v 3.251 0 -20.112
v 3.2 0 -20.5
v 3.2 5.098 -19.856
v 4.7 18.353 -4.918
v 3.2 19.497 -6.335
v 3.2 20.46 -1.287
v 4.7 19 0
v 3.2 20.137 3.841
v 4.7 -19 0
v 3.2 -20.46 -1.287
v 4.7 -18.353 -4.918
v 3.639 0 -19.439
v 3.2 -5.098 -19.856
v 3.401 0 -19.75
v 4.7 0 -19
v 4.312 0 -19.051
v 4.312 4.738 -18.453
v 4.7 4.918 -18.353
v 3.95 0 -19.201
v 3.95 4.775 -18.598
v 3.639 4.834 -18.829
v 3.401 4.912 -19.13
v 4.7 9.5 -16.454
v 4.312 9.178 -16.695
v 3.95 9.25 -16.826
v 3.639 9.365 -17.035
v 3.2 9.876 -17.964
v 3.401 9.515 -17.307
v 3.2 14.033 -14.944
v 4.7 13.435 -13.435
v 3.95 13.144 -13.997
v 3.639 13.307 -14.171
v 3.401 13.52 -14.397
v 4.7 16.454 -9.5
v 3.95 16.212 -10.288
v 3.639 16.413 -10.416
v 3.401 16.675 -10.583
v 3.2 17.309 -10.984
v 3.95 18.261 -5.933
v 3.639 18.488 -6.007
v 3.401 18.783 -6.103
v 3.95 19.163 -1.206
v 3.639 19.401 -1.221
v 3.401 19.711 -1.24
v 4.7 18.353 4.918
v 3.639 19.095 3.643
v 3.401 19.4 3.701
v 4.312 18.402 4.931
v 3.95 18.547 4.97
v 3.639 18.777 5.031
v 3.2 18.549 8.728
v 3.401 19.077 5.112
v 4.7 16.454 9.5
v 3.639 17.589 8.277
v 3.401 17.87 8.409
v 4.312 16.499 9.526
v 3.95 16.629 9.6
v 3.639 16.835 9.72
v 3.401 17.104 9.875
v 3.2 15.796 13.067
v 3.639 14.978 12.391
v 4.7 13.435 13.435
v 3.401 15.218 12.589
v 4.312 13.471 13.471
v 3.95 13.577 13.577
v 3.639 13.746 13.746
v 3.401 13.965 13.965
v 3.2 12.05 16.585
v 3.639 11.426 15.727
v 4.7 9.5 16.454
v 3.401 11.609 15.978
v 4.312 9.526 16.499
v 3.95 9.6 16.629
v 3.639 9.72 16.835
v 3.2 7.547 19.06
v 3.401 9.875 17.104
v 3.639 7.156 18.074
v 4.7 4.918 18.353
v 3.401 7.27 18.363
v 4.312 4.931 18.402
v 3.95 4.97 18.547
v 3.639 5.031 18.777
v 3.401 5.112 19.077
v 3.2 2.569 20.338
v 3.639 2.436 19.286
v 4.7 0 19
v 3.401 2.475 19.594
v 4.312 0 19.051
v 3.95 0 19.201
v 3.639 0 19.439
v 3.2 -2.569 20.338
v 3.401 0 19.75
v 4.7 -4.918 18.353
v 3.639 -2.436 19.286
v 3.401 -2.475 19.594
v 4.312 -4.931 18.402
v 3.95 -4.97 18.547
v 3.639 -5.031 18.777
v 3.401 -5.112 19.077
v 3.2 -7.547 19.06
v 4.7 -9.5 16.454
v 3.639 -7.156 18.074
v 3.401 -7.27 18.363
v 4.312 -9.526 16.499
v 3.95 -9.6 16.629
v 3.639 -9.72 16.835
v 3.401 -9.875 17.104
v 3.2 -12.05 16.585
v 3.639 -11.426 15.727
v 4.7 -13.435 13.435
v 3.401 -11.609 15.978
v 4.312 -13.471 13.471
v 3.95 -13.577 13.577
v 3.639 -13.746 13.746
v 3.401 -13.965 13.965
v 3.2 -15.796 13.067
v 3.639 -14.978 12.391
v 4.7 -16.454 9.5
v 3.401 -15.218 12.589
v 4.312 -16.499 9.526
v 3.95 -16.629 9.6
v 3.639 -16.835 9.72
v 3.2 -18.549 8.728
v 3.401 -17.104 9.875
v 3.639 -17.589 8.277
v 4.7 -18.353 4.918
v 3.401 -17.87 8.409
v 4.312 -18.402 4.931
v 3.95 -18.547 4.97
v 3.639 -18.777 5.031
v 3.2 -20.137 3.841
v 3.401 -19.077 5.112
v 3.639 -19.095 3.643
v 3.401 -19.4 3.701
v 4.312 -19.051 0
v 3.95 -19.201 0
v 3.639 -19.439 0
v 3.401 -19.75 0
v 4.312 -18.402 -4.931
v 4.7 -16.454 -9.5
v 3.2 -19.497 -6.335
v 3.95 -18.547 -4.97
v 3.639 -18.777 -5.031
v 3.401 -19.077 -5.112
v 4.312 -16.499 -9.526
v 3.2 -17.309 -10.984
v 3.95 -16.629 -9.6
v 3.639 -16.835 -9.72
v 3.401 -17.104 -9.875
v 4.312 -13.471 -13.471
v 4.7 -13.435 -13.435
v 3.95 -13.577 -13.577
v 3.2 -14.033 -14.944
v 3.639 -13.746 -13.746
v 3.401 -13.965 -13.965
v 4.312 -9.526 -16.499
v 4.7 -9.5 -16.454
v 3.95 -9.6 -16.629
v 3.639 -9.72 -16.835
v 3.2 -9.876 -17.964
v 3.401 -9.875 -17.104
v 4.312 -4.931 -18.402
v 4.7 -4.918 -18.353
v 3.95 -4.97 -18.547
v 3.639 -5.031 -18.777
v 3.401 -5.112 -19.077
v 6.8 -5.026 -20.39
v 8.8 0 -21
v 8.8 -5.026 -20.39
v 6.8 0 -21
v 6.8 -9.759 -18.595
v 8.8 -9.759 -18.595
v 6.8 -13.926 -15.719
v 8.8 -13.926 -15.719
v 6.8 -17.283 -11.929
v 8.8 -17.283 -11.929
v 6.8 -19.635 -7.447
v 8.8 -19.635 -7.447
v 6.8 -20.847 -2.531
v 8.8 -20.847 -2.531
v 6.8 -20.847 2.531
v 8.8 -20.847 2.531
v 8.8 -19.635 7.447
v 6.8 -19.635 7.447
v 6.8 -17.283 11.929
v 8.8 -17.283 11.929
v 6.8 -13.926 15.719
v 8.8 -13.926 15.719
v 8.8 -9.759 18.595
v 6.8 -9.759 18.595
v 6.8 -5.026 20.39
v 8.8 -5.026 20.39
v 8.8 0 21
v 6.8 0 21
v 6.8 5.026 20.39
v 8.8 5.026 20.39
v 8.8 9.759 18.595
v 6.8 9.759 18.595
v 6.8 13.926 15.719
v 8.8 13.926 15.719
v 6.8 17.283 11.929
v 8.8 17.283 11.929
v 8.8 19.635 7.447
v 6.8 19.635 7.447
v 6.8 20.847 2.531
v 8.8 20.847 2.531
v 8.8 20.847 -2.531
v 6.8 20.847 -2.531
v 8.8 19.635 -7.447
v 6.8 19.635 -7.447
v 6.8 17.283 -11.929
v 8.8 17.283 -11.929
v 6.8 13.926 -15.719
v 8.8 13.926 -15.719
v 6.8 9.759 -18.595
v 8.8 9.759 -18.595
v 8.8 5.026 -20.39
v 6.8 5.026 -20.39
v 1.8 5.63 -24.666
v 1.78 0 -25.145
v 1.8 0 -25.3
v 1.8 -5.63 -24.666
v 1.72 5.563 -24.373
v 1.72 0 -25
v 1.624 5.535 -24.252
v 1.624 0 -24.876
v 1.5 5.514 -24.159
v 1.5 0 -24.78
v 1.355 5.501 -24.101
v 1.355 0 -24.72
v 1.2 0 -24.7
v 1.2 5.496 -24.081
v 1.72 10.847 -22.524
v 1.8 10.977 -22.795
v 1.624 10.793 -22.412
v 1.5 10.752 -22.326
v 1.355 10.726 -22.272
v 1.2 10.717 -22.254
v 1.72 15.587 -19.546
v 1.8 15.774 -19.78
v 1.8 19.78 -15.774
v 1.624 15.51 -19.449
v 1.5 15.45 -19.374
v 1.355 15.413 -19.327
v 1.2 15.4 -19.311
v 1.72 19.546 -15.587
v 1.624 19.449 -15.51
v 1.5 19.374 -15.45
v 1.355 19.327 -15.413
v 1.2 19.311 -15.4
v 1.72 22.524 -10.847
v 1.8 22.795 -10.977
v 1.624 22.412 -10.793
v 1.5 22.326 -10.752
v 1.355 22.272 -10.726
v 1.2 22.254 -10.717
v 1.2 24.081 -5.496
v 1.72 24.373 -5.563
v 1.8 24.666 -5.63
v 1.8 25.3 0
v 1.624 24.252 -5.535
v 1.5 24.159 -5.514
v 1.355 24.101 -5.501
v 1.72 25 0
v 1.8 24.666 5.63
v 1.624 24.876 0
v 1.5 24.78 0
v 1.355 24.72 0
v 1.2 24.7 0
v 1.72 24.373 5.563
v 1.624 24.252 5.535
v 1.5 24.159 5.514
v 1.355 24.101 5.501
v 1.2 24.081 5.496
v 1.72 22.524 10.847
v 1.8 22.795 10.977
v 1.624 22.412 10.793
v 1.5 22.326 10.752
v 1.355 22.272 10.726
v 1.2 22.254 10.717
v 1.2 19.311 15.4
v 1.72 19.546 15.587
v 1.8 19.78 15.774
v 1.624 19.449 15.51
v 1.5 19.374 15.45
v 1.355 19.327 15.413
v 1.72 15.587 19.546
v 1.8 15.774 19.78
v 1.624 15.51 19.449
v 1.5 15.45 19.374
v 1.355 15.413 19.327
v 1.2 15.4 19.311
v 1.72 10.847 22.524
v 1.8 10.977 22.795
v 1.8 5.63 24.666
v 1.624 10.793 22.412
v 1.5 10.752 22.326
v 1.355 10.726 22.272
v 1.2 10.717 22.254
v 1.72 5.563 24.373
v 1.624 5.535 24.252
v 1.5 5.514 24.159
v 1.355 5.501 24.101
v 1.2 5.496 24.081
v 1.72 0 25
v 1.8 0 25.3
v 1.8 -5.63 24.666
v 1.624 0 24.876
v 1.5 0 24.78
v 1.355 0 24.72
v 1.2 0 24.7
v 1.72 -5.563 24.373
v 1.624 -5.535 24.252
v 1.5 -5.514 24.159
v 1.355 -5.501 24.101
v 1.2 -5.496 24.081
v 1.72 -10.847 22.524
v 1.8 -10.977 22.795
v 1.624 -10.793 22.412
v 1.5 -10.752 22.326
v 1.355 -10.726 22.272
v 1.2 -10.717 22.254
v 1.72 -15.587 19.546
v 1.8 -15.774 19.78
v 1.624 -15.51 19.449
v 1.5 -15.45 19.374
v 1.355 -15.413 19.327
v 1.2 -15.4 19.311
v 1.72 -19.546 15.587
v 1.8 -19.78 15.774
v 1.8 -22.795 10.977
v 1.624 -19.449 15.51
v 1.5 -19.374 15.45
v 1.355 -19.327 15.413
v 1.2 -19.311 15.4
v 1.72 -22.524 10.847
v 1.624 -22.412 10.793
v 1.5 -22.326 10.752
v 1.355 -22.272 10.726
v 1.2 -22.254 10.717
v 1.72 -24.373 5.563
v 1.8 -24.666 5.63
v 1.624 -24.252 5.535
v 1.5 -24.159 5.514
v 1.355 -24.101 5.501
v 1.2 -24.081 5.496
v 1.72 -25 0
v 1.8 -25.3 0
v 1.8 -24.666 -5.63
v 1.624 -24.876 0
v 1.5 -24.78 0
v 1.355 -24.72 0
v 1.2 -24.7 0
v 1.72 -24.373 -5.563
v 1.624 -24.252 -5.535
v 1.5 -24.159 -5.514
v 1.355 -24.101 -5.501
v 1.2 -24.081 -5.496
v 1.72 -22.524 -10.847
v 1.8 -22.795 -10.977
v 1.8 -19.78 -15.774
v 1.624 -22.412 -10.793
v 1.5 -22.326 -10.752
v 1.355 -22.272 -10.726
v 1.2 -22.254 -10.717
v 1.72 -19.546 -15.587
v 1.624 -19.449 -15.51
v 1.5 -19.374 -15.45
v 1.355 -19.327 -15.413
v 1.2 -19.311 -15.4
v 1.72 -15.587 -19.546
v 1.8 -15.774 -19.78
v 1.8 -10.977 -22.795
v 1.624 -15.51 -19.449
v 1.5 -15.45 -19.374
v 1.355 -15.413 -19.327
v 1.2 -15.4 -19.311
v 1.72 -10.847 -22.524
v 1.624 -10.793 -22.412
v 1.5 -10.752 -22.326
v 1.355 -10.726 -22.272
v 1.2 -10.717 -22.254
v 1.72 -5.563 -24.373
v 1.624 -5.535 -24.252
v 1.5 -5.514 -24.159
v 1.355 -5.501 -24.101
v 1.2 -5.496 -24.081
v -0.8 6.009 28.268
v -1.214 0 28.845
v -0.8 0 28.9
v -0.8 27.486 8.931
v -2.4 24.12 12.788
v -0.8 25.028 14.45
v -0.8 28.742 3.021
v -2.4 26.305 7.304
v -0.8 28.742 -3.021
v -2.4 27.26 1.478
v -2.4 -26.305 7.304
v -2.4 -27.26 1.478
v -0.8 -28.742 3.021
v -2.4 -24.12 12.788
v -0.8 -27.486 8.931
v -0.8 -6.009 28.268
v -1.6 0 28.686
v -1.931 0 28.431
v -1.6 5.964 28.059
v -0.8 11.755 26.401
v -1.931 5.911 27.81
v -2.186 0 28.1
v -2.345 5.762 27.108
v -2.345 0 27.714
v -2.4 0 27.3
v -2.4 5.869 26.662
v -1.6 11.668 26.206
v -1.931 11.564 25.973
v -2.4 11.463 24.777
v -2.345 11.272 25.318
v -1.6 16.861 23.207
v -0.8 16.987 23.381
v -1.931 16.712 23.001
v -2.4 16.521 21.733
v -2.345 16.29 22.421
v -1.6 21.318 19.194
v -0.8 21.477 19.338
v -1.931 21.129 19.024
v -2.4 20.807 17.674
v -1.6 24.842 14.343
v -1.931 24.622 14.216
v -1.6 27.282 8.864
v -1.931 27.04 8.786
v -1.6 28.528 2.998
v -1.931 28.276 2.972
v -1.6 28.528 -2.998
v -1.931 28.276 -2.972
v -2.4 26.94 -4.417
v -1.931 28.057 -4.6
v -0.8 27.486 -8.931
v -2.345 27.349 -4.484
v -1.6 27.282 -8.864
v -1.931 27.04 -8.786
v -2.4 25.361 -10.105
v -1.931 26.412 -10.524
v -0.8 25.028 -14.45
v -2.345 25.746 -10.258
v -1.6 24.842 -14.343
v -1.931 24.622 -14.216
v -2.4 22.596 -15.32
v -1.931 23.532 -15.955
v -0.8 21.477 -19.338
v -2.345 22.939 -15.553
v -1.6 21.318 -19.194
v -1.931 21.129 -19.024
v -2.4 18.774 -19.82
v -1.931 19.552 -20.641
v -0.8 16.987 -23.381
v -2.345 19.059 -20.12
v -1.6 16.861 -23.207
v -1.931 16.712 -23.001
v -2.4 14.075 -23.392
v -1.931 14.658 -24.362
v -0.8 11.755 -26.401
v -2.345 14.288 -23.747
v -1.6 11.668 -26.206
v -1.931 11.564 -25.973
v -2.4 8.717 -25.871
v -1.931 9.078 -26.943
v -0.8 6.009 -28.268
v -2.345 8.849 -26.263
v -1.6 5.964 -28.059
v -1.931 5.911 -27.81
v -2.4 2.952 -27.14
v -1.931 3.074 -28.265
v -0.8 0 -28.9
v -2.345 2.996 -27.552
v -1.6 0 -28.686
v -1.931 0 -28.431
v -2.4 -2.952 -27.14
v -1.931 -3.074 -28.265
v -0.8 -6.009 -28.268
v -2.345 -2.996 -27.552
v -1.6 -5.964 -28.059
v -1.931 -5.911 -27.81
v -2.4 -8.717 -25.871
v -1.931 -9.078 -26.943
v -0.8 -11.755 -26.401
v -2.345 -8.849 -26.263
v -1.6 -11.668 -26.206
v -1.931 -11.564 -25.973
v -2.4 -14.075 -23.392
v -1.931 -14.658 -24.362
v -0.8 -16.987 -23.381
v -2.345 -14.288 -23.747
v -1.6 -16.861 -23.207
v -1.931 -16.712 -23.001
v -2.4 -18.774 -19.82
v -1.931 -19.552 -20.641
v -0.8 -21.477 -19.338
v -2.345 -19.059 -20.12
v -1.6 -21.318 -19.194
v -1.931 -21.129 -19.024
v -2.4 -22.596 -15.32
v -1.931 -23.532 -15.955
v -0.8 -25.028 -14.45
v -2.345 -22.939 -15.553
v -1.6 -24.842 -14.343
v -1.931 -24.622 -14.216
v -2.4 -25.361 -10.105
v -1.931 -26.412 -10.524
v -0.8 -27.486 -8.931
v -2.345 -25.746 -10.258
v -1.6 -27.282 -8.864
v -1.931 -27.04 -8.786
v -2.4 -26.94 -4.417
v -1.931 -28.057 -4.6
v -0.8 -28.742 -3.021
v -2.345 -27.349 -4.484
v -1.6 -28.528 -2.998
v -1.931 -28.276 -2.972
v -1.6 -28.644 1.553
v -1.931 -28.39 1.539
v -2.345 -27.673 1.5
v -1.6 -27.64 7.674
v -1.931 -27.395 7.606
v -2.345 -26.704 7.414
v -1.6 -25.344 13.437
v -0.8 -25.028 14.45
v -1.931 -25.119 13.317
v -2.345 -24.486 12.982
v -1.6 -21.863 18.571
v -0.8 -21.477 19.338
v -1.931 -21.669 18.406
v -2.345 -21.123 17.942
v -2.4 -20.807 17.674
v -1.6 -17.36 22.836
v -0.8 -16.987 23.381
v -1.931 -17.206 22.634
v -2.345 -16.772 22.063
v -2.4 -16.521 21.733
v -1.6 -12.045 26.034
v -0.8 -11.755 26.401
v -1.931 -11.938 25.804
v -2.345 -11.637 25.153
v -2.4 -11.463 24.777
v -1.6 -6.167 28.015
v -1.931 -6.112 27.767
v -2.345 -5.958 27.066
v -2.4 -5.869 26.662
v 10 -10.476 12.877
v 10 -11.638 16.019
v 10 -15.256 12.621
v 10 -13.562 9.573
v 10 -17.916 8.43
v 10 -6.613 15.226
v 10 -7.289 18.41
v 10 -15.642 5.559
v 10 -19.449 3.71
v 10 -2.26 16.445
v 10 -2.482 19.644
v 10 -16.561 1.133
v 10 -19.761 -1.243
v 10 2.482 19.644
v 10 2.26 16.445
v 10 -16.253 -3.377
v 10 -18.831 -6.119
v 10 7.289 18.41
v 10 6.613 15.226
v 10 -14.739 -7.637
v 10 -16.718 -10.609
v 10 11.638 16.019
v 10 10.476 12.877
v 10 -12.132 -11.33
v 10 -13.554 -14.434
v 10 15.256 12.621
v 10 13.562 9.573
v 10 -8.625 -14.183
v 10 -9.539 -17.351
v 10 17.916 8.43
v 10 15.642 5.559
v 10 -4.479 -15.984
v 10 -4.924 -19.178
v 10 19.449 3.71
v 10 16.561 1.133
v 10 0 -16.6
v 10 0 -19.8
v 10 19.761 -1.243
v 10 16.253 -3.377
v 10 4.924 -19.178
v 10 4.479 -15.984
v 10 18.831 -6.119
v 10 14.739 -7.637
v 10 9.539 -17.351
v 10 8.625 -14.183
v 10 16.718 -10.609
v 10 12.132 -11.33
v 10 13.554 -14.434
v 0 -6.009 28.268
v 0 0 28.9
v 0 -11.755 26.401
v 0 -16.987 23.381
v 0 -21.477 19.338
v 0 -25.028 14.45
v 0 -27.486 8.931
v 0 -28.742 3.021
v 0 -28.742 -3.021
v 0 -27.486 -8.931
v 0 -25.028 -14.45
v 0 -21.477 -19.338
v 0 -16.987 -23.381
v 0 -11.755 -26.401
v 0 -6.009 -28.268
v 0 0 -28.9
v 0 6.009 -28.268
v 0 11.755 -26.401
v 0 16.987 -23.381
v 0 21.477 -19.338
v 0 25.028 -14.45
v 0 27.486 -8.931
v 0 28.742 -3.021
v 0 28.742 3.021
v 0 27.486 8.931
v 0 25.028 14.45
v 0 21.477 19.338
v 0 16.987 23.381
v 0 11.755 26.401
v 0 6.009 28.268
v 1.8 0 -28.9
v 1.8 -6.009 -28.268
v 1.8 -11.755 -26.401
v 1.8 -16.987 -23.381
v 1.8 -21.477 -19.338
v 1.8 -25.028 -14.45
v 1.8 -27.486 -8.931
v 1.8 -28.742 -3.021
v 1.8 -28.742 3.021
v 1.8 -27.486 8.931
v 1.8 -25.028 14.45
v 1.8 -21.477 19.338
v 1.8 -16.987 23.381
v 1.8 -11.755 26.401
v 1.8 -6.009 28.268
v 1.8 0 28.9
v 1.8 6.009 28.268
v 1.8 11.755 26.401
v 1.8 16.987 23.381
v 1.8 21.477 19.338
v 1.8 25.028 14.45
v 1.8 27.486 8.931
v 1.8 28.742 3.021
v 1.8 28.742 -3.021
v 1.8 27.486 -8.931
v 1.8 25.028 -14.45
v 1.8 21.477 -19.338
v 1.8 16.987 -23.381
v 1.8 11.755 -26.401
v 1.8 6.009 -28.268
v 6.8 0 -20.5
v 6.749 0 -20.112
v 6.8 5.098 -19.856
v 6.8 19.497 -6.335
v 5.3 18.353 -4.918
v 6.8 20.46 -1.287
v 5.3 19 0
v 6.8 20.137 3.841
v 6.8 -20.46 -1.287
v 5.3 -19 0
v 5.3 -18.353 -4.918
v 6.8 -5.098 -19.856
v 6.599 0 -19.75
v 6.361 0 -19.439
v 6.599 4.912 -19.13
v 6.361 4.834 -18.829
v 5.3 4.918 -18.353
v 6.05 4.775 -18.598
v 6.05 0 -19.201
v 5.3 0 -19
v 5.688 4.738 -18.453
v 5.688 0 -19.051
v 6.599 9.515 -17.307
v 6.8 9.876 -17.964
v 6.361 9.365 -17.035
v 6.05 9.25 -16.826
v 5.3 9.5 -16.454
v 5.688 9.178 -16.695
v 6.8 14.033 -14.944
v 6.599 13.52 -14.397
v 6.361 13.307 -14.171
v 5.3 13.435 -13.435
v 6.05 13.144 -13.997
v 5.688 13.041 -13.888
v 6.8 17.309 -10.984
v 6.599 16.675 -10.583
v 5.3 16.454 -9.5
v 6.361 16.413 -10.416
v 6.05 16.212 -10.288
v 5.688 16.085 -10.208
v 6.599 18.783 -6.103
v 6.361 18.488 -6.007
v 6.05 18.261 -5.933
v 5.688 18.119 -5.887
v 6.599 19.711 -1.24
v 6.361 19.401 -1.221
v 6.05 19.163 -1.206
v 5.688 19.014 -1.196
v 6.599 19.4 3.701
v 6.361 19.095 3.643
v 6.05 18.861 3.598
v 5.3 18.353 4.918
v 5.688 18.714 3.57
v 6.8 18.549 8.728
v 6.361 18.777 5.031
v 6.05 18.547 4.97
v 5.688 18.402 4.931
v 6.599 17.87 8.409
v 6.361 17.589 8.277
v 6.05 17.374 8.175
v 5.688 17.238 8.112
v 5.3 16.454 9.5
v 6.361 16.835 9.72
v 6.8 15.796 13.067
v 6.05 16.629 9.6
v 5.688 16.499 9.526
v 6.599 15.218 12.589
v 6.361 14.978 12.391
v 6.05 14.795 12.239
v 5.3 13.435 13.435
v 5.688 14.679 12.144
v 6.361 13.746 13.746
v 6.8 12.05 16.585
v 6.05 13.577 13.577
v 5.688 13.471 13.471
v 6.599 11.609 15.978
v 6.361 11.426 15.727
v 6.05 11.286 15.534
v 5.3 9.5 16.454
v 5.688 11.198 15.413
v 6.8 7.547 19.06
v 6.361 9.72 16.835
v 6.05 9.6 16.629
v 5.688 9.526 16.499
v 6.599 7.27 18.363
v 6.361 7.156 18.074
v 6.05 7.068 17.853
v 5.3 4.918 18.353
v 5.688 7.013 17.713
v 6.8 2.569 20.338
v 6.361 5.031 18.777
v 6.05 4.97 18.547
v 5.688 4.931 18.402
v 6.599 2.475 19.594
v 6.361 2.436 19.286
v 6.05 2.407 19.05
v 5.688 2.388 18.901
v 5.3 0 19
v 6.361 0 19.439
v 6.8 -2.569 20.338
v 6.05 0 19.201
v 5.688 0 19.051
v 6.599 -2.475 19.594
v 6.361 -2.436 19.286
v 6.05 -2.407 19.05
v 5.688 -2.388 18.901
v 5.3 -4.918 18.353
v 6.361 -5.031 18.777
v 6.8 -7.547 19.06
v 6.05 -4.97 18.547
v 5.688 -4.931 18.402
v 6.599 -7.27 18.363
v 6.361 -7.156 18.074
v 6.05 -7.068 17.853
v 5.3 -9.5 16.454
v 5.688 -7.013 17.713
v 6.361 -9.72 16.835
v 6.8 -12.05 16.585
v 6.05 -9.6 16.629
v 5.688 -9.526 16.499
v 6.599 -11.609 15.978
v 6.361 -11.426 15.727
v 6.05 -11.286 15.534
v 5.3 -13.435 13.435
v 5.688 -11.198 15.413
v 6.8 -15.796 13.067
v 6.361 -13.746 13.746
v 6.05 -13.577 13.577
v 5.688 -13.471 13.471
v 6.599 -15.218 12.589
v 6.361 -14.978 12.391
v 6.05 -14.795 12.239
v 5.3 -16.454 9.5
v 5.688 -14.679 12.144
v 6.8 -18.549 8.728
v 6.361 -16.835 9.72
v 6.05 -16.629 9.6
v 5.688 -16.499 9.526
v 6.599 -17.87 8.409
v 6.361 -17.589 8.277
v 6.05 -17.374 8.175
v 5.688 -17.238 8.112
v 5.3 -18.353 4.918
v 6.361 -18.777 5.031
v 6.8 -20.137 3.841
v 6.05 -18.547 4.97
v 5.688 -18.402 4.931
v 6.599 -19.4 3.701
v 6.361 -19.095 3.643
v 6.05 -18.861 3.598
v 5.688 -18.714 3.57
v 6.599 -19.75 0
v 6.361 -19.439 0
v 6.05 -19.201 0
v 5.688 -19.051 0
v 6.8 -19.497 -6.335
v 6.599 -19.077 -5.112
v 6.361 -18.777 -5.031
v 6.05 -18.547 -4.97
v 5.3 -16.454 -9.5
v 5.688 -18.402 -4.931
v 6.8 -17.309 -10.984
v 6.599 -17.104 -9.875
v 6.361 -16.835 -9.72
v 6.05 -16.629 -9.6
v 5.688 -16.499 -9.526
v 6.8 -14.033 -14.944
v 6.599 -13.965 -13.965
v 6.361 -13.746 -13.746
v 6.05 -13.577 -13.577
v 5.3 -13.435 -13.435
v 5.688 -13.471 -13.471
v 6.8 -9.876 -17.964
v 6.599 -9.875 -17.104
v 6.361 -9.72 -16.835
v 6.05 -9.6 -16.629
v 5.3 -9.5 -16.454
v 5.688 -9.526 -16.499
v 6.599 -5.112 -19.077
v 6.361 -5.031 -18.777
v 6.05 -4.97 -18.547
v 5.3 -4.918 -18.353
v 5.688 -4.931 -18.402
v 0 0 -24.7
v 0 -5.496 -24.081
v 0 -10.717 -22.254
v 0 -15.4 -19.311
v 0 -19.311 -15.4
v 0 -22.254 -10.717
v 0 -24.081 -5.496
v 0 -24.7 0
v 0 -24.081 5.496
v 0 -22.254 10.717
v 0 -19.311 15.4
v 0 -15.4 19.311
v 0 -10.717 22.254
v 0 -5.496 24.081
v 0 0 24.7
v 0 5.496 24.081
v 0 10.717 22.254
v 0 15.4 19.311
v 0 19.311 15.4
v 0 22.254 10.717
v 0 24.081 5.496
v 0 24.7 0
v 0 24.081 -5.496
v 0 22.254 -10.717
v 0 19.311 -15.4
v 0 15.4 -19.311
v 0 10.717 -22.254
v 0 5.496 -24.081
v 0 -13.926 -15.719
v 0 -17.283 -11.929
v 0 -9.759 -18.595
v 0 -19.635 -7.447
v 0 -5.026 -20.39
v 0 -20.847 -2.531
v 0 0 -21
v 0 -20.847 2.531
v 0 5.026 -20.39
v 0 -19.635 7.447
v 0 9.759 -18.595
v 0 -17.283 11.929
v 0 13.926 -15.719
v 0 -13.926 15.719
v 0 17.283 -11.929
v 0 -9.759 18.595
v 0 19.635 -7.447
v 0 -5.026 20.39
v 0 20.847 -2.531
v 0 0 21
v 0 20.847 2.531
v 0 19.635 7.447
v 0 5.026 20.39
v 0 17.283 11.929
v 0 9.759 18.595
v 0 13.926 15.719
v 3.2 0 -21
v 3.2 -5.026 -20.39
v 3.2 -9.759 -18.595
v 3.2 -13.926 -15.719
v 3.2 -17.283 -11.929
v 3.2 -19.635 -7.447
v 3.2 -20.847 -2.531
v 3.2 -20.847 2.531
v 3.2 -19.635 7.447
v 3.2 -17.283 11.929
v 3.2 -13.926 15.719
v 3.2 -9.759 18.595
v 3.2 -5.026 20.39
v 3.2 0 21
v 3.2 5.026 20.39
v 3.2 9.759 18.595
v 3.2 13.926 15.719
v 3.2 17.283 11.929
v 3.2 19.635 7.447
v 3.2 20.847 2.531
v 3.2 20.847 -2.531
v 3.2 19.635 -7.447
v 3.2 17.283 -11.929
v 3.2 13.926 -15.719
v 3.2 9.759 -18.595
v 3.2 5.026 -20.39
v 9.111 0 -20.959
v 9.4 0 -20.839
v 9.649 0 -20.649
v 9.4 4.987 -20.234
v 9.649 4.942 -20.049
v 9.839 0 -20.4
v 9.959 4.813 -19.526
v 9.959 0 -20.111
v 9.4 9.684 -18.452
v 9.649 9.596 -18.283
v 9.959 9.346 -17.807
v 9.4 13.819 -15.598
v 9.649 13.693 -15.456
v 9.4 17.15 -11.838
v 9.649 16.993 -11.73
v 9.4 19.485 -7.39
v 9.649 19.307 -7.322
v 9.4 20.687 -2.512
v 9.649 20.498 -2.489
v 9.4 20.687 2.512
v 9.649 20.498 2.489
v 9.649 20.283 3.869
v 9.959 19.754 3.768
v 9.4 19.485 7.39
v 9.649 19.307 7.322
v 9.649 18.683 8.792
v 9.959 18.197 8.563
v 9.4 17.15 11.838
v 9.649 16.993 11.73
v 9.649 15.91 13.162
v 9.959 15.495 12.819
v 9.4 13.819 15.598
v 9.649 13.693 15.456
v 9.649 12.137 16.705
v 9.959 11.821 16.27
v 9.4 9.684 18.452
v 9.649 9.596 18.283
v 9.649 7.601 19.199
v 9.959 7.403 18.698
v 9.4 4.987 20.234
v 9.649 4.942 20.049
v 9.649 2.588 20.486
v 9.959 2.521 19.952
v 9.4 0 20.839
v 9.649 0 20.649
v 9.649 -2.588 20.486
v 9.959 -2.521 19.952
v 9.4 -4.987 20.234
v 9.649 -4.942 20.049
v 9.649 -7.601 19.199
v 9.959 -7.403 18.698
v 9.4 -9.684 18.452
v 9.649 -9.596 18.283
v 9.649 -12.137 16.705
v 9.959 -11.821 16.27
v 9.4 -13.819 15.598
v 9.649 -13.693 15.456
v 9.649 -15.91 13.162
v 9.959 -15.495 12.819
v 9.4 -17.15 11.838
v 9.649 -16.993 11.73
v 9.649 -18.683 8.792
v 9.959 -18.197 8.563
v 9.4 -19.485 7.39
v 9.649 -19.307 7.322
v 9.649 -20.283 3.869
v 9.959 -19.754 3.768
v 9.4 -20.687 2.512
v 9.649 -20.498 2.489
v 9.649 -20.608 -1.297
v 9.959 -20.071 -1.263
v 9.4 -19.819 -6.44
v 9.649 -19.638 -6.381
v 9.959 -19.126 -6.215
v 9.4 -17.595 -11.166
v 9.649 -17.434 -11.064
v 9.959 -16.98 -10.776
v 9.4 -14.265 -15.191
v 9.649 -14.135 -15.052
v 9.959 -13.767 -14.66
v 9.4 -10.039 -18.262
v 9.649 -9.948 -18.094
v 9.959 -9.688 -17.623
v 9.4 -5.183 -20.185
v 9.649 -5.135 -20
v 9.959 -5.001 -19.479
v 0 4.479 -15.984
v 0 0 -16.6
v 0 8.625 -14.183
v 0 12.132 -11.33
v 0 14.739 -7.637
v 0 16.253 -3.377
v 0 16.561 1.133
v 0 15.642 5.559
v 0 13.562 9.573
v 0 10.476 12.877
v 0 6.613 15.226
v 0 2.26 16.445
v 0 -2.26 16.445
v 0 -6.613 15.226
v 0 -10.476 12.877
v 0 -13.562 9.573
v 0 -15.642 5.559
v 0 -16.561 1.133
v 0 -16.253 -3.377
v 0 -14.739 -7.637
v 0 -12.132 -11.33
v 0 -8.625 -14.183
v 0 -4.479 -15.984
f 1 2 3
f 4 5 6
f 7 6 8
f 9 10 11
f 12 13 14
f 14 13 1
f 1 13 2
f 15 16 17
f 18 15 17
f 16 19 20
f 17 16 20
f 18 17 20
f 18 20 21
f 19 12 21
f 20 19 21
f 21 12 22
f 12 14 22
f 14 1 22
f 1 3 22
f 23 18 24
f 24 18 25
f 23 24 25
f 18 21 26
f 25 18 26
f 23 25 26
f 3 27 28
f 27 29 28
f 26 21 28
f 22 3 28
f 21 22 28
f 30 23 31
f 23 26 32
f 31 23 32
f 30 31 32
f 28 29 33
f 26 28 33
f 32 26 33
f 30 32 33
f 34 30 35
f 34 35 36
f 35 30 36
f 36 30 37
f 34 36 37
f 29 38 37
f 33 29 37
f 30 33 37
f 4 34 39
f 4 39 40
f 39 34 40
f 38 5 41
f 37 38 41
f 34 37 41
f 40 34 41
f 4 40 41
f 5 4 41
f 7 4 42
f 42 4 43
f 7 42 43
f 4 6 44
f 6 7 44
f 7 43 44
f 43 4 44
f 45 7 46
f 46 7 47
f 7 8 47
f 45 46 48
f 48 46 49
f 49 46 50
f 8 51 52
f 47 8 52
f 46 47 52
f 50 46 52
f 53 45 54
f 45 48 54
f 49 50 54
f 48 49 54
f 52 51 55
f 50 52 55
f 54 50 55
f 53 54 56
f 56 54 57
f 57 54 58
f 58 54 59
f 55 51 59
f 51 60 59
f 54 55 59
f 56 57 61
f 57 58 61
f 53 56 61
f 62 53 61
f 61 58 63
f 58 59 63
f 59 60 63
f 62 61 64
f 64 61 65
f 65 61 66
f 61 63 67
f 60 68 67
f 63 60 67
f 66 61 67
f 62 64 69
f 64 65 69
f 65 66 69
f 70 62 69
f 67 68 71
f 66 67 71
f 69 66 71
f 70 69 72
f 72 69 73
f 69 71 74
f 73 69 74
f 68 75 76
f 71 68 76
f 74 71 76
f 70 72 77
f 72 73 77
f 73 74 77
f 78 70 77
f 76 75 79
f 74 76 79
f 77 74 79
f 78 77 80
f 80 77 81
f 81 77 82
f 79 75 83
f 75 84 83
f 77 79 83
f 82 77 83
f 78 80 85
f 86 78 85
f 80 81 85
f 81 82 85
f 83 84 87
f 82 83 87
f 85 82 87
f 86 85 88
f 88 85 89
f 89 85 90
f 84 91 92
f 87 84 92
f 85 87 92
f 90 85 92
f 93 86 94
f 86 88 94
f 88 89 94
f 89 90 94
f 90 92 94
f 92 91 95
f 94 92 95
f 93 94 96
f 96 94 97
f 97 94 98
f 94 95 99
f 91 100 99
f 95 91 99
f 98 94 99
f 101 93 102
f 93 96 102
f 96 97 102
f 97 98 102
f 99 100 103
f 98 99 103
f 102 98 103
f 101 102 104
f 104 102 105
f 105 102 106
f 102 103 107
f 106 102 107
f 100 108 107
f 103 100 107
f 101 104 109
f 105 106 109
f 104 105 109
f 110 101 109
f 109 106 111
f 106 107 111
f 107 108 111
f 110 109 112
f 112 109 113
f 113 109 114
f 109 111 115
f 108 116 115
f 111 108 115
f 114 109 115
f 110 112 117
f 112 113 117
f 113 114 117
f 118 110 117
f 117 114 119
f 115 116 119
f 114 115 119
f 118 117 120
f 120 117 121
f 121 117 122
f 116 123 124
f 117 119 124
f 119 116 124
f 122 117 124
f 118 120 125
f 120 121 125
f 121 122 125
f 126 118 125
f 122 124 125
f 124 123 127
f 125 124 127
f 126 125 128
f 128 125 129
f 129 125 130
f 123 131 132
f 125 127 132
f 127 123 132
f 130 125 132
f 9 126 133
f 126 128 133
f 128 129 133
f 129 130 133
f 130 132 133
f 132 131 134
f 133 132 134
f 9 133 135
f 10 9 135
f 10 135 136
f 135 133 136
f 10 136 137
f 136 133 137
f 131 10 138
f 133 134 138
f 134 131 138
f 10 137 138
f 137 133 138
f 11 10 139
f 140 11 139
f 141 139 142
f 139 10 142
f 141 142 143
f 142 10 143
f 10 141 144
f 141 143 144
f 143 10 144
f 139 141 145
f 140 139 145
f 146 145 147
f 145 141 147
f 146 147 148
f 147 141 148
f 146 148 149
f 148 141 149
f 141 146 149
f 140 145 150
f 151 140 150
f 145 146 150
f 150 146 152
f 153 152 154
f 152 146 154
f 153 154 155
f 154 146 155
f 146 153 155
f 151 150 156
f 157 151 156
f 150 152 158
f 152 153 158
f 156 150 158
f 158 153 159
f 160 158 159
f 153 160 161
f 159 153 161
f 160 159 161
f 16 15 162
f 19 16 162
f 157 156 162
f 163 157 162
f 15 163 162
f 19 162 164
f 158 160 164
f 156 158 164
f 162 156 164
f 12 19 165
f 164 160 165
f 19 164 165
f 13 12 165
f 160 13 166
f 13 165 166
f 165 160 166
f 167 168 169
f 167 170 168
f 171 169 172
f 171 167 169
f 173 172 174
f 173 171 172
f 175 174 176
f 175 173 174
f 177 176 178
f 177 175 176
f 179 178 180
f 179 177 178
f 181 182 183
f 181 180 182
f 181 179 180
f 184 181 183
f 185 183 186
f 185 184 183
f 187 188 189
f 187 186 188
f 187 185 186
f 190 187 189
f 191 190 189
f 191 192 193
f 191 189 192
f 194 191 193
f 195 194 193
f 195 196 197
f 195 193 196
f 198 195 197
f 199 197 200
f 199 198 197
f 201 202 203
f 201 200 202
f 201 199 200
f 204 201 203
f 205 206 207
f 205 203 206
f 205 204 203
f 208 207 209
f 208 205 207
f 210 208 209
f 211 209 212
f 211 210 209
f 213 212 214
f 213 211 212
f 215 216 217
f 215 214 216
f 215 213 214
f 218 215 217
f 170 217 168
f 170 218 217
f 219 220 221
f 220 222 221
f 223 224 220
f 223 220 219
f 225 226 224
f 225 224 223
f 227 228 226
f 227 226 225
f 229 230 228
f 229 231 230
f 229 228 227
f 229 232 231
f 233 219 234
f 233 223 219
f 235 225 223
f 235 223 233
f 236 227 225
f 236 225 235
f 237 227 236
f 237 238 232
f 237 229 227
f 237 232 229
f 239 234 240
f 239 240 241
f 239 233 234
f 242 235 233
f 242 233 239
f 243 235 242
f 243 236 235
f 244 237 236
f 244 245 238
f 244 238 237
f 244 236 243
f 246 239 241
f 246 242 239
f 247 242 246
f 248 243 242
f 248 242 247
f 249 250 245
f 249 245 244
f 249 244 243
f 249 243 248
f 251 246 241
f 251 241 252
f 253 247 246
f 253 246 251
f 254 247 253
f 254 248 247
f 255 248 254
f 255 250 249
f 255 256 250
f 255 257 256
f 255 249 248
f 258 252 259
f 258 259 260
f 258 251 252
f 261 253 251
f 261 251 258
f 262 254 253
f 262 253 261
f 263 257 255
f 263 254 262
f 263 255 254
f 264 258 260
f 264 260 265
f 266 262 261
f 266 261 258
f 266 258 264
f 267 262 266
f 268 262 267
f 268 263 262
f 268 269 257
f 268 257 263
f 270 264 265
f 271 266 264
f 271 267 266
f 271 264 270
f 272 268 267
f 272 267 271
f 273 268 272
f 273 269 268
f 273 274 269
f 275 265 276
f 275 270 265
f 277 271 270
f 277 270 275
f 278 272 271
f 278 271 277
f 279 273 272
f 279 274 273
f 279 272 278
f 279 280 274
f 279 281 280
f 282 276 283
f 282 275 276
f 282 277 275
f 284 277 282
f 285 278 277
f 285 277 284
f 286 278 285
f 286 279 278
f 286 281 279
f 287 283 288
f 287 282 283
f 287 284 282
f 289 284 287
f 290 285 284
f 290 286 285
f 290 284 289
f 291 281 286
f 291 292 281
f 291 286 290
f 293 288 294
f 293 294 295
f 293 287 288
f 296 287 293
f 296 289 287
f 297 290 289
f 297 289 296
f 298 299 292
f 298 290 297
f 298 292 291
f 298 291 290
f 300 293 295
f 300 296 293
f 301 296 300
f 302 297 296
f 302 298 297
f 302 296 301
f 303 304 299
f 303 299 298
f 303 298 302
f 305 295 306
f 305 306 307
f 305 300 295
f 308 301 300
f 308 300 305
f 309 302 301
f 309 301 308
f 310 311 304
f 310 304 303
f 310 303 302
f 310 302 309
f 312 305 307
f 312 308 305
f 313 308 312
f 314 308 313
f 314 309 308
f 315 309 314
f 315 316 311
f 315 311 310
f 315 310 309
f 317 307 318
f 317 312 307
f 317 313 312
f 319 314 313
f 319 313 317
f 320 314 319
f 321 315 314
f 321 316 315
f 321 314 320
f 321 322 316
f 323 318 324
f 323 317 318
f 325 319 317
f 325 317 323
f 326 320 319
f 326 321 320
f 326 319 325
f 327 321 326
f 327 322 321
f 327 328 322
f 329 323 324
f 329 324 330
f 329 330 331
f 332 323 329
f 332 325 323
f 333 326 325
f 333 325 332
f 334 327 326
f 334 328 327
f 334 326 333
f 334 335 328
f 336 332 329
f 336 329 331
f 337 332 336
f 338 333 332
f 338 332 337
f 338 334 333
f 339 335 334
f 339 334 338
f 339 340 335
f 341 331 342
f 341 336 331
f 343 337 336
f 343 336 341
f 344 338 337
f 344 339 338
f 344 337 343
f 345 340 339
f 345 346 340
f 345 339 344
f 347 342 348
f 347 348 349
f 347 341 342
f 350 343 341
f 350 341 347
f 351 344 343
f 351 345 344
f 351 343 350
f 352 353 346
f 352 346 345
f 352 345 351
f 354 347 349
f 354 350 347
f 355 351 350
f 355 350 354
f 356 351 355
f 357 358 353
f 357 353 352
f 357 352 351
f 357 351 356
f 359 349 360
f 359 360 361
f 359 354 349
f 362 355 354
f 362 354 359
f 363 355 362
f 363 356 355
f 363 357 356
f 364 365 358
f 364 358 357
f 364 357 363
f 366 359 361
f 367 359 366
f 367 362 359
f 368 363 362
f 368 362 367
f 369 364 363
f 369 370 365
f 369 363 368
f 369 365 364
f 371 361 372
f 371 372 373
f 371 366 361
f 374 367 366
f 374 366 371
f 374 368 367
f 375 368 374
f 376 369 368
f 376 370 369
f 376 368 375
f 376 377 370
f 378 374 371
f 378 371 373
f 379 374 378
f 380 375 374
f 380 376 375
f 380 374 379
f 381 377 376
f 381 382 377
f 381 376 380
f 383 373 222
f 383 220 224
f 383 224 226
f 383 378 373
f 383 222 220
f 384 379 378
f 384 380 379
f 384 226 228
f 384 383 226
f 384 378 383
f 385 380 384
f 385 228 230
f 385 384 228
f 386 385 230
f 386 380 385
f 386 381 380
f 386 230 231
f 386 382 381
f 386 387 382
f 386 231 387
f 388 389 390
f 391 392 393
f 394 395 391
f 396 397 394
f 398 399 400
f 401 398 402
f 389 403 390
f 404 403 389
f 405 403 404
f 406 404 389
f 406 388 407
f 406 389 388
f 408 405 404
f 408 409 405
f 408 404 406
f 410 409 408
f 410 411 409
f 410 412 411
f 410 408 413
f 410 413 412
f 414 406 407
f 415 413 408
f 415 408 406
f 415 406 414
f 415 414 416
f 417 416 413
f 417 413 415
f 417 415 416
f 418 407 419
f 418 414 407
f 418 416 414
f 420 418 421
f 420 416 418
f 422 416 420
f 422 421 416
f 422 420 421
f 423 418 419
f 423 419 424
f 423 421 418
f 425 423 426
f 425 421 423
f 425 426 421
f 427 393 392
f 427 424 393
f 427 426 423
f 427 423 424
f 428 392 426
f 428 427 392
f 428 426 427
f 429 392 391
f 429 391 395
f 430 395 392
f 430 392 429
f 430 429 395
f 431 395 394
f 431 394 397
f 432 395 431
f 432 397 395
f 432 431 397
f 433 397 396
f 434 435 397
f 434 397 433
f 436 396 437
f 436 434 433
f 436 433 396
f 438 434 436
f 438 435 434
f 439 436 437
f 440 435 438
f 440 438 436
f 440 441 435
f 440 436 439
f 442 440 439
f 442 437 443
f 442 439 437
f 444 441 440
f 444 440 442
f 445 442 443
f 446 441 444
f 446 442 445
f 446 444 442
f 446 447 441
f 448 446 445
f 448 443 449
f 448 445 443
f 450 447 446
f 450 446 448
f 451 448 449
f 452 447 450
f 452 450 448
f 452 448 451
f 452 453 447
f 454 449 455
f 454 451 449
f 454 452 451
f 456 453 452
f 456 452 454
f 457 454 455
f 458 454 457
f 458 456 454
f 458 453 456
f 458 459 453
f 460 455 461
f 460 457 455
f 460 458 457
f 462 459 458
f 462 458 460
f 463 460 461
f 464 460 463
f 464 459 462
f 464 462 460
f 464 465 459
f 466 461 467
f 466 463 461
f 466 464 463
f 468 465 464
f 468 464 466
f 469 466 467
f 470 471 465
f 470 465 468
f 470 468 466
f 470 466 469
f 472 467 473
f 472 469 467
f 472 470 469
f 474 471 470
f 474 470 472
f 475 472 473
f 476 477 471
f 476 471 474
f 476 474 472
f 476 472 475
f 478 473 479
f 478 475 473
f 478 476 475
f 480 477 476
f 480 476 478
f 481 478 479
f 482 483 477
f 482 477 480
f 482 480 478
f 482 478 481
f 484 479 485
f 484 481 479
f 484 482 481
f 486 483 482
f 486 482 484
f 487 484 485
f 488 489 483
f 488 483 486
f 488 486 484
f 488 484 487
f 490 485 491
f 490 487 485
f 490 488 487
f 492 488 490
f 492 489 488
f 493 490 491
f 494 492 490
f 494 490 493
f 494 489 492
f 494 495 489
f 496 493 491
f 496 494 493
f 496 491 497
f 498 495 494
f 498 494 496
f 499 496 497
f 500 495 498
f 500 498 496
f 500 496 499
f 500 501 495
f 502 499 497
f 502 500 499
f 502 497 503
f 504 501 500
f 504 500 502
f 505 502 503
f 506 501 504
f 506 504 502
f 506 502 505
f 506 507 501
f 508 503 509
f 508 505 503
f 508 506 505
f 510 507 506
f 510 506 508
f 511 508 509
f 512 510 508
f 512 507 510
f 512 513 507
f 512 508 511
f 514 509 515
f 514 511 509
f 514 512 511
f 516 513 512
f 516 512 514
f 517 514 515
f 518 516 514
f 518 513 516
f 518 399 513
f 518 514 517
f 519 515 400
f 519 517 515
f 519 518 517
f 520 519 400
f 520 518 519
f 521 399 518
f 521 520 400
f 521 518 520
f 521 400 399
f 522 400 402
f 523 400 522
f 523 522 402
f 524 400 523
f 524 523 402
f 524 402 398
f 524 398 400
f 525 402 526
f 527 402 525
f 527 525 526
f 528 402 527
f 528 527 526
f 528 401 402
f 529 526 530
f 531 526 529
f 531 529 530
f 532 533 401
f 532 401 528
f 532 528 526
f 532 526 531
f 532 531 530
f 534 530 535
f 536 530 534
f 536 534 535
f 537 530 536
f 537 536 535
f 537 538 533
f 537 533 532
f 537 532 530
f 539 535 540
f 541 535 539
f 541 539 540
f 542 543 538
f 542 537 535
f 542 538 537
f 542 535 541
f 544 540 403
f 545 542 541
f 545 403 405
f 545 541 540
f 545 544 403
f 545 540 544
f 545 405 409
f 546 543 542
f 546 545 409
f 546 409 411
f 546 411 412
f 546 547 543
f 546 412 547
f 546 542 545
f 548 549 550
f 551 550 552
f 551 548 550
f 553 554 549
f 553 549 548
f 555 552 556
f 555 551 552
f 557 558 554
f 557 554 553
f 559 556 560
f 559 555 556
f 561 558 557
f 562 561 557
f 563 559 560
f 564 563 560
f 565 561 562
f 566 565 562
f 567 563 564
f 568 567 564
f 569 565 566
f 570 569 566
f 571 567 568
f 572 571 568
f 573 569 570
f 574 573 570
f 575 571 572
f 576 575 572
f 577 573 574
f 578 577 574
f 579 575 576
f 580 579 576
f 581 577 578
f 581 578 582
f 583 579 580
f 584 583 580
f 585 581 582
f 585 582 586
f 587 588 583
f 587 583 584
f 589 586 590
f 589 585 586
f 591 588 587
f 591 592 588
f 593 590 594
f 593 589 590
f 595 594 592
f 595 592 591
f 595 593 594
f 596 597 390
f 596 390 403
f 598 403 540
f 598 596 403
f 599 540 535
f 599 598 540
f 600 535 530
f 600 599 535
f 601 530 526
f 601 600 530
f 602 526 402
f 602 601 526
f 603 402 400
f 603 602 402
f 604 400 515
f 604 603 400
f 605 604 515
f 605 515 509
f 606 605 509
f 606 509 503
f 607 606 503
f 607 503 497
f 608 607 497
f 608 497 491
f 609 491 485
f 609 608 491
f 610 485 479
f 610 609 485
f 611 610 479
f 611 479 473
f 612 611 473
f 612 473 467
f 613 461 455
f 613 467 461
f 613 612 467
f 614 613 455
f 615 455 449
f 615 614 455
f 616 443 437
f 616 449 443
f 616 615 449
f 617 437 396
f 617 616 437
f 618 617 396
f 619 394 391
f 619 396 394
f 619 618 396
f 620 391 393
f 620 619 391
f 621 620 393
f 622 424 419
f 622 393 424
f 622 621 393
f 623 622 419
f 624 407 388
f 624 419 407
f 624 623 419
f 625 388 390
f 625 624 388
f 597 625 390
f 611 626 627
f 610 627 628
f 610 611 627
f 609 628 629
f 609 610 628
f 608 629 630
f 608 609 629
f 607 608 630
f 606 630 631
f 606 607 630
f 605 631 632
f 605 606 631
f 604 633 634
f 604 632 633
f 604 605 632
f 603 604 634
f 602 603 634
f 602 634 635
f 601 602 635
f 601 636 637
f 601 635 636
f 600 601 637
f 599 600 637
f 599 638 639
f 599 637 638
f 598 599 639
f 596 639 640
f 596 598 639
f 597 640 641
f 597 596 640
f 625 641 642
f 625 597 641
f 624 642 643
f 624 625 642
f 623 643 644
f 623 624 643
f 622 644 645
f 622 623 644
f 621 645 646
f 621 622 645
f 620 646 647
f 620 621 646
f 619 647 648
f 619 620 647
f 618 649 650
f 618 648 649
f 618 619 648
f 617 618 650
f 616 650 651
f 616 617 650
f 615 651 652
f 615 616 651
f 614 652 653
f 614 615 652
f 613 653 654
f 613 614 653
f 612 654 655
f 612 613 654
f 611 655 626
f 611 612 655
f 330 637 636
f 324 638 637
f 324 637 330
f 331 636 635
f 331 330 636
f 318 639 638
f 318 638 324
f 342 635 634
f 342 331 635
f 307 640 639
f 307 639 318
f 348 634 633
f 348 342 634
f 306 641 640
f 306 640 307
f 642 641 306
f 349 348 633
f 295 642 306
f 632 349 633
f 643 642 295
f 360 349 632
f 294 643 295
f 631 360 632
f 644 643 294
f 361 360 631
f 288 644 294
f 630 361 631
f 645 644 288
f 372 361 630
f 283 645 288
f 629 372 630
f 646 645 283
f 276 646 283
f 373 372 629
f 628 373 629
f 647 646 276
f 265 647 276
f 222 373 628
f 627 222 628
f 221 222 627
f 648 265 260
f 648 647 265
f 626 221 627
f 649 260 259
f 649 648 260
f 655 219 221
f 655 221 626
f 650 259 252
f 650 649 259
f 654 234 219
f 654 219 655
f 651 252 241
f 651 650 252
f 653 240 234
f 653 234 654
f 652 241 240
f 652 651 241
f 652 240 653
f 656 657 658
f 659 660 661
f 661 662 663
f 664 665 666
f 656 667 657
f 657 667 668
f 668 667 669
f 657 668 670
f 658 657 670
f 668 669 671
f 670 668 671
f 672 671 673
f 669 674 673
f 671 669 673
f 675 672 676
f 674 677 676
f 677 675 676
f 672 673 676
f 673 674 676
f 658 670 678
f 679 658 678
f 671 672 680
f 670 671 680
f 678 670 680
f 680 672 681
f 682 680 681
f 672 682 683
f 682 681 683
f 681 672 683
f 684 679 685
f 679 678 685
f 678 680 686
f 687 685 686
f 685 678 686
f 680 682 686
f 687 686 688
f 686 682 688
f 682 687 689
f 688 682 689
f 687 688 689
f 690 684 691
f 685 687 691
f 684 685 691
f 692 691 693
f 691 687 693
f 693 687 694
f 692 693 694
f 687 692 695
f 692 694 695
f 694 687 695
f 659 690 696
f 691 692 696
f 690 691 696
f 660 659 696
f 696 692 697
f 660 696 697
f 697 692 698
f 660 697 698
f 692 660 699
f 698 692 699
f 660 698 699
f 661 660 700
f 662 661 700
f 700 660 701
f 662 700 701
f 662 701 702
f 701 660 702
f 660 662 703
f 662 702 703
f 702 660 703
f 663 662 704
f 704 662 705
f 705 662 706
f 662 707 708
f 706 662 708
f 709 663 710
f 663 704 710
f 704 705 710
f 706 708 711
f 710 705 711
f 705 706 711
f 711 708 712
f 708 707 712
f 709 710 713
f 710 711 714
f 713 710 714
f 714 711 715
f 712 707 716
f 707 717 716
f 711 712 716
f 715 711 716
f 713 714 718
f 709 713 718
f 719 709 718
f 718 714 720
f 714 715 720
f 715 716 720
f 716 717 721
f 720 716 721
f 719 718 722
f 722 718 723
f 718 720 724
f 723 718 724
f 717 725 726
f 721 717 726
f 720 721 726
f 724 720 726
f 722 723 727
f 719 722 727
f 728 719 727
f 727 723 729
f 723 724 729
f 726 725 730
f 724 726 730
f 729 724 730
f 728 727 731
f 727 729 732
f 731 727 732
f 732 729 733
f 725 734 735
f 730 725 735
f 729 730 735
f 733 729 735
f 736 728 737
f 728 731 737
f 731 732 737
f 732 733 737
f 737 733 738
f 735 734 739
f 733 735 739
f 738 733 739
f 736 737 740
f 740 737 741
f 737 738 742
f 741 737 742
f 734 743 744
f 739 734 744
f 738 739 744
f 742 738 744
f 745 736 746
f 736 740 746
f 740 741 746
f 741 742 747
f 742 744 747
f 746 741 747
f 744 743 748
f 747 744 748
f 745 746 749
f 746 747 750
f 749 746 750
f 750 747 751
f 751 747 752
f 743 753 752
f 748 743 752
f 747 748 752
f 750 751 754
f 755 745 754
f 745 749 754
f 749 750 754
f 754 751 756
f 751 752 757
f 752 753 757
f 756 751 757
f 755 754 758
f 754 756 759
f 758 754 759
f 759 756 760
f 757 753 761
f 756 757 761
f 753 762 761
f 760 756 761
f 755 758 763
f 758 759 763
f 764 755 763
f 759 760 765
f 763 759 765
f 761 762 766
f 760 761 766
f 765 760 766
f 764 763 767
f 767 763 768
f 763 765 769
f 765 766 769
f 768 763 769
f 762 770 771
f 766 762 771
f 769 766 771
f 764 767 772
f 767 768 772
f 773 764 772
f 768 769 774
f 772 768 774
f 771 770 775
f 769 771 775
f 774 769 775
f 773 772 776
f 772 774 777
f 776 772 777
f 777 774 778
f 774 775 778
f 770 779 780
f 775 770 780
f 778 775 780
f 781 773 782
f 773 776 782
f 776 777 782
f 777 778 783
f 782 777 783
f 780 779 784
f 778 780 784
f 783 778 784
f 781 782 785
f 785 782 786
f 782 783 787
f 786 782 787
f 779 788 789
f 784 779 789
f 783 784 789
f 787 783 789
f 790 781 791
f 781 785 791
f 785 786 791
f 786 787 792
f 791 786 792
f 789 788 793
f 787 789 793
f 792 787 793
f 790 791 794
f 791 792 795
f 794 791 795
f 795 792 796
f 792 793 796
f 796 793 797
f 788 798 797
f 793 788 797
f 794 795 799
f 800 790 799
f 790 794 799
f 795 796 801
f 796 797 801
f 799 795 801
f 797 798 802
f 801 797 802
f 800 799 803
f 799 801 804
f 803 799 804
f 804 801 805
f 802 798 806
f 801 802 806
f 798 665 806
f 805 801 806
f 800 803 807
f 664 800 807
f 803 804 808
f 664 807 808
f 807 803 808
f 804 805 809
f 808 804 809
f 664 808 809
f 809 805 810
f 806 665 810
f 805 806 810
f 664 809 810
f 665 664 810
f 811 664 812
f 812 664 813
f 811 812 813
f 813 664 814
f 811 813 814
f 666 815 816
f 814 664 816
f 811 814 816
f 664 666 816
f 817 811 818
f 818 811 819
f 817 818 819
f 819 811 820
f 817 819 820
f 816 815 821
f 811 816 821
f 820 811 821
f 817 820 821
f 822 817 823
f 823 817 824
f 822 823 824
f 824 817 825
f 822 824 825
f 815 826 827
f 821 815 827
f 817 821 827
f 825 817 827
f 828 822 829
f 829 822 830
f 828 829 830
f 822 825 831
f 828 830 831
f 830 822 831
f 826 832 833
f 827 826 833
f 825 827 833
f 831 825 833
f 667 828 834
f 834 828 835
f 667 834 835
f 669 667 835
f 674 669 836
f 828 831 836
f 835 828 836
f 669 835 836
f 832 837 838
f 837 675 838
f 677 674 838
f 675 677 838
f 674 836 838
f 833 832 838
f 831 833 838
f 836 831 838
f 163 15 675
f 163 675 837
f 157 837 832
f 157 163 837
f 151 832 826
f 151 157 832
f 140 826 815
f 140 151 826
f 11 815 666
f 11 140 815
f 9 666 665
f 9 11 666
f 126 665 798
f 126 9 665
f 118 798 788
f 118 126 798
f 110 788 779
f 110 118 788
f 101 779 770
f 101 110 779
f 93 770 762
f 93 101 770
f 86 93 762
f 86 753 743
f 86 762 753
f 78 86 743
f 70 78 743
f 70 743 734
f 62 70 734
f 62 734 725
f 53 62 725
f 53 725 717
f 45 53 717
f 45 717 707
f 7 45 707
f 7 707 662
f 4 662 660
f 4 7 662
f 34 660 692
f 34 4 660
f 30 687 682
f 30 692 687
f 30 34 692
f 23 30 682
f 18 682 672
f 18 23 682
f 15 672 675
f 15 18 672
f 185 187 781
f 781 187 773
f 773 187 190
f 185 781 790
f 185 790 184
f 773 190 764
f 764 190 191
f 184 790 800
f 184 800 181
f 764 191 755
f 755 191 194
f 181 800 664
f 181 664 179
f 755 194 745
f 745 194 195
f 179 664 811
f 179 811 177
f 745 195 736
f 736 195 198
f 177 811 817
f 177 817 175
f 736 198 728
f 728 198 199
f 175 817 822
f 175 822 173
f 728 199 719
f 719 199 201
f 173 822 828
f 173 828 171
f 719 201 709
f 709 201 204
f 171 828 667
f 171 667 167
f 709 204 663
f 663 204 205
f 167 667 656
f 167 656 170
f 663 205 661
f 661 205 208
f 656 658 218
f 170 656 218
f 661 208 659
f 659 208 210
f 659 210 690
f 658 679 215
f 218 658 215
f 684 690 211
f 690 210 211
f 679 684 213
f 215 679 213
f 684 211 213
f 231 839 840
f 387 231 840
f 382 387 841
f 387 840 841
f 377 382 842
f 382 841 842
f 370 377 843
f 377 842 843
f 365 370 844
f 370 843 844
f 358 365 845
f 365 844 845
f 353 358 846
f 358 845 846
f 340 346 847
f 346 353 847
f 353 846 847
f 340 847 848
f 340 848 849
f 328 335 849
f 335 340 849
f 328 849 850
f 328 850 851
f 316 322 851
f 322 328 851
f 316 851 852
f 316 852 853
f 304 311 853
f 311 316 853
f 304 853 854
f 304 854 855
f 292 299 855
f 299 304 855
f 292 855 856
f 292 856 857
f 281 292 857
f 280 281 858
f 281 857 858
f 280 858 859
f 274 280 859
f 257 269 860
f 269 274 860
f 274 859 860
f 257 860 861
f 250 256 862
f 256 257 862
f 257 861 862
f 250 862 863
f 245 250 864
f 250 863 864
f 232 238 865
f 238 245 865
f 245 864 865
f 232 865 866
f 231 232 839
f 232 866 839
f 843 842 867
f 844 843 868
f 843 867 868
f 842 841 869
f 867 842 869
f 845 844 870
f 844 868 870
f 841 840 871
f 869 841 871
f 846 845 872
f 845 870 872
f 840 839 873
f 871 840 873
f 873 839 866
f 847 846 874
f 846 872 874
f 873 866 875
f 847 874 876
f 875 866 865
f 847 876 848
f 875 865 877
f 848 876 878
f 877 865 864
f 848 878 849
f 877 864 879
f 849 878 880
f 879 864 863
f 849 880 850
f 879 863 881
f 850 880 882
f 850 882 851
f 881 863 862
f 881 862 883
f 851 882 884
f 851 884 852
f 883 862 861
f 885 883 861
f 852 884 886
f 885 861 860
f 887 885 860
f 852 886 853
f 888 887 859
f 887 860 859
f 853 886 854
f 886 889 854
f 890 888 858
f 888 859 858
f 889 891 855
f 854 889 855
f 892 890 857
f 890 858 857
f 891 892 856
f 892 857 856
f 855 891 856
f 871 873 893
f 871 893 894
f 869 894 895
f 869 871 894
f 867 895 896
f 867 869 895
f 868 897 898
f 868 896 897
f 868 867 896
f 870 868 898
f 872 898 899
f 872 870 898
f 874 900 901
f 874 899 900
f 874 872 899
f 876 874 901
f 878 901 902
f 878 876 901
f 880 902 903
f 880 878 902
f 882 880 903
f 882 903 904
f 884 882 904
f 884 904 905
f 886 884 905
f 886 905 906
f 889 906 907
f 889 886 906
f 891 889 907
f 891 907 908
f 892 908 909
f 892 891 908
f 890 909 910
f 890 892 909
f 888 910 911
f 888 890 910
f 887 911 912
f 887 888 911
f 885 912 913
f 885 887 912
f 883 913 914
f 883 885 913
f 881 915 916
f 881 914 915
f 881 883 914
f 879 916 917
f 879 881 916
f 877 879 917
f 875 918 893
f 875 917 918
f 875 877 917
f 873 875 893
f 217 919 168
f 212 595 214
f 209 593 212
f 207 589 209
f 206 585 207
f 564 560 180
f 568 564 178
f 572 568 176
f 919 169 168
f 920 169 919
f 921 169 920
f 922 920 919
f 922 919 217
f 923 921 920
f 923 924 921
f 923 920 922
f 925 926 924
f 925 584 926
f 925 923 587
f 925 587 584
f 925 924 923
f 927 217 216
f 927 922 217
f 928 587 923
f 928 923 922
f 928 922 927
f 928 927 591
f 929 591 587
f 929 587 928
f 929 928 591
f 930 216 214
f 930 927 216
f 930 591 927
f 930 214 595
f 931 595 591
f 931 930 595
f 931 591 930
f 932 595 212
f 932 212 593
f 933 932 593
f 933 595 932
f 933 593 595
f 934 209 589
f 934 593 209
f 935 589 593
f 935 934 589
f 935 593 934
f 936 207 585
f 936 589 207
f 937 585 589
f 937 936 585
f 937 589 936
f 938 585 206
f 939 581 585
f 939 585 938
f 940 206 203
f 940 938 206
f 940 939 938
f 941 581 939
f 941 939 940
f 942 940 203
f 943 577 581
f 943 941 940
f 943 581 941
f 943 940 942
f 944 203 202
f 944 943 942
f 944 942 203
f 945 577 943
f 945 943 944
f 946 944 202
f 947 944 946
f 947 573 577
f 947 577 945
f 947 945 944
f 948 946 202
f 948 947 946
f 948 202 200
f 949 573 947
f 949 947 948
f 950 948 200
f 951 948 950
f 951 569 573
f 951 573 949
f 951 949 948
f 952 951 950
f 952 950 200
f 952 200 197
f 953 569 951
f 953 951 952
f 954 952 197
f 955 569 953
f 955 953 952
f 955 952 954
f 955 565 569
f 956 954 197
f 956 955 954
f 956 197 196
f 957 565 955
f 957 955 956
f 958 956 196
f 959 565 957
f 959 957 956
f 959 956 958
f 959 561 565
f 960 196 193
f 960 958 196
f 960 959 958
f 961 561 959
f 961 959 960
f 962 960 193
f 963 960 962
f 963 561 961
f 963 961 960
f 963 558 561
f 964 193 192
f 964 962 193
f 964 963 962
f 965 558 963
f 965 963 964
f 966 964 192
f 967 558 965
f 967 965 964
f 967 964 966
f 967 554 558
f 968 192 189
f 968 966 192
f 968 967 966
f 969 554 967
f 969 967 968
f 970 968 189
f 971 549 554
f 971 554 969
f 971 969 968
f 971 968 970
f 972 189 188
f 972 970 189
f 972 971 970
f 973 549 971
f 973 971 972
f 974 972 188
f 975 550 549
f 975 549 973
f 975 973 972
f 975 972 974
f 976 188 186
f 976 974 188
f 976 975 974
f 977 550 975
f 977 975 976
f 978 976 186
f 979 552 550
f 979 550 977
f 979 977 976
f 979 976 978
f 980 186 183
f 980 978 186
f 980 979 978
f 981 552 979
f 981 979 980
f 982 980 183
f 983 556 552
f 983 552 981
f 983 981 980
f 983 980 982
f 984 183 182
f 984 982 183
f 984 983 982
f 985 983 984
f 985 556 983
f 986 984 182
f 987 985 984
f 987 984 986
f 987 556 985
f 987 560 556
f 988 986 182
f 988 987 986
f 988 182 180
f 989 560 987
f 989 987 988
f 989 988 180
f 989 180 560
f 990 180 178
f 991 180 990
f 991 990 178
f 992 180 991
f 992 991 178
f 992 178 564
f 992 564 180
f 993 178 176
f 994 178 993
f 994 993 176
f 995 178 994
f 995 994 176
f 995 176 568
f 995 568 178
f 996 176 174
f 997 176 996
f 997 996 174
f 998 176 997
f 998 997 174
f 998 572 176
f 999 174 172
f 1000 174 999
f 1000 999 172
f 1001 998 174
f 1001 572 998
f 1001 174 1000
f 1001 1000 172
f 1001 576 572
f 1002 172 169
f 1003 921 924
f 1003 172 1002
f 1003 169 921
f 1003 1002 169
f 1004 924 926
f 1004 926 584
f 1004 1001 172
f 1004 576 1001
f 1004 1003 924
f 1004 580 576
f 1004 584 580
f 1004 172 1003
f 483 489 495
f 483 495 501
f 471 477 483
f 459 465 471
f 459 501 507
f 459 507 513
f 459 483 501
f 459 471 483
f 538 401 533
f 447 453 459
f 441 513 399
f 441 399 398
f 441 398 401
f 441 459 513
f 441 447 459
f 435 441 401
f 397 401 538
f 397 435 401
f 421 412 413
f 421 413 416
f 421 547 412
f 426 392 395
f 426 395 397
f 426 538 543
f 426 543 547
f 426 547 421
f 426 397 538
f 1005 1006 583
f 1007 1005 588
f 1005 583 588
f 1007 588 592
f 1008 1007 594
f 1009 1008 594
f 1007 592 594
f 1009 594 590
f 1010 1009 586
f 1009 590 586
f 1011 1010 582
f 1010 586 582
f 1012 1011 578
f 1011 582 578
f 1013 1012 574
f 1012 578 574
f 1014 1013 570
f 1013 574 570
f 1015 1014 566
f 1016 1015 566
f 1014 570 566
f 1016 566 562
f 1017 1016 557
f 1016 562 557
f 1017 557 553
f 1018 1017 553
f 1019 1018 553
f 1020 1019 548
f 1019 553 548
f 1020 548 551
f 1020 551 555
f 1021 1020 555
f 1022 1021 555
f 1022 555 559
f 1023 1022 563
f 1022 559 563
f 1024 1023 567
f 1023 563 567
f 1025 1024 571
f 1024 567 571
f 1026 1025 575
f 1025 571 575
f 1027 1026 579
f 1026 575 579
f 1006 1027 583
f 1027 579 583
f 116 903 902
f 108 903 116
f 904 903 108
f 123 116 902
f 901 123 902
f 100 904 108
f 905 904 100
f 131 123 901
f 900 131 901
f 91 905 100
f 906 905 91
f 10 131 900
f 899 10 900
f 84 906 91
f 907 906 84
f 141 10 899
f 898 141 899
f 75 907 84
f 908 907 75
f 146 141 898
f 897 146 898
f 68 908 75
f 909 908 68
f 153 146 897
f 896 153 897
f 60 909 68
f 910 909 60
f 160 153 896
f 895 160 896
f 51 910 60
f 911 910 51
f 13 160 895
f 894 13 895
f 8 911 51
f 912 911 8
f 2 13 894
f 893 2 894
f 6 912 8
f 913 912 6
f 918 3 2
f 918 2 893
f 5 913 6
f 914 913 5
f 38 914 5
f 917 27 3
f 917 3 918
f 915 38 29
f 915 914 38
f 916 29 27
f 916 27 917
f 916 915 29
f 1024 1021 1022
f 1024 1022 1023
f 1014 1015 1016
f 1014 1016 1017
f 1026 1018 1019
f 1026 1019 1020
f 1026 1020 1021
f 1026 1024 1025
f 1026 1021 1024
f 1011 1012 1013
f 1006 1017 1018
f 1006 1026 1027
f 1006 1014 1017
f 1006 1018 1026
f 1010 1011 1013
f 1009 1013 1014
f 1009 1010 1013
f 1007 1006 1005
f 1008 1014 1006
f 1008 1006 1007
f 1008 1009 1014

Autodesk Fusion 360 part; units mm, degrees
sketch "Sketch1" plane through (0, 0, 0) normal (1, 0, 0) x (0, 0, -1)
  circle A0 centre (0, 0) radius 21
  dimension "d1" = 42
extrude "Extrude1" add sketch "Sketch1" along normal blind 3.2
sketch "Sketch2" plane through (3.2, 0, 0) normal (1, 0, 0) x (0, 0, -1)
  circle A0 centre (0, 0) radius 21
  circle A1 centre (0, 0) radius 19
  dimension "d4" = 38
extrude "Extrude2" add sketch "Sketch2" along normal blind 3.6 contours A1
sketch "Sketch3" plane through (6.8, 0, 0) normal (1, 0, 0) x (0, 0, -1)
  circle A0 centre (0, 0) radius 19
  circle A1 centre (0, 0) radius 21
  dimension "d7" = 42
extrude "Extrude3" add sketch "Sketch3" along normal blind 3.2 contours A0 | A1
fillet "Fillet1" radius 1.5 2 edges at (3.2, 6.8707, 17.7142) (6.8, -6.8707, 17.7142)
sketch "Sketch4" plane through (0, 0, 0) normal (-1, 0, 0) x (0, 0, 1)
  circle A0 centre (0, 0) radius 21
  circle A1 centre (0, 0) radius 28.9
  dimension "d11" = 57.8
extrude "Extrude4" add sketch "Sketch4" along normal blind 2.4 contours A0 | A1
sketch "Sketch5" plane through (0, 0, 0) normal (1, 0, 0) x (0, 0, -1)
  circle A0 centre (0, 0) radius 28.9
  circle A1 centre (0, 0) radius 21
  circle A2 centre (0, 0) radius 24.7
  dimension "d14" = 49.4
extrude "Extrude5" add sketch "Sketch5" along normal blind 1.8 contours A0
sketch "Sketch6" plane through (10, 0, 0) normal (1, 0, 0) x (0, 0, -1)
  circle A0 centre (0, 0) radius 21
  circle A1 centre (0, 0) radius 19
  circle A2 centre (0, 0) radius 16.6
  dimension "d17" = -2.4
extrude "Extrude6" cut sketch "Sketch6" against normal blind 10 contours A2
fillet "Fillet2" radius 1.2 1 edges at (10, -7.5939, 19.5789)
fillet "Fillet3" radius 1.6 1 edges at (-2.4, -10.4507, -26.9443)
fillet "Fillet4" radius 0.6 1 edges at (1.8, 8.9319, 23.0285)
equation "d4 = 41 mm - 3 mm"
